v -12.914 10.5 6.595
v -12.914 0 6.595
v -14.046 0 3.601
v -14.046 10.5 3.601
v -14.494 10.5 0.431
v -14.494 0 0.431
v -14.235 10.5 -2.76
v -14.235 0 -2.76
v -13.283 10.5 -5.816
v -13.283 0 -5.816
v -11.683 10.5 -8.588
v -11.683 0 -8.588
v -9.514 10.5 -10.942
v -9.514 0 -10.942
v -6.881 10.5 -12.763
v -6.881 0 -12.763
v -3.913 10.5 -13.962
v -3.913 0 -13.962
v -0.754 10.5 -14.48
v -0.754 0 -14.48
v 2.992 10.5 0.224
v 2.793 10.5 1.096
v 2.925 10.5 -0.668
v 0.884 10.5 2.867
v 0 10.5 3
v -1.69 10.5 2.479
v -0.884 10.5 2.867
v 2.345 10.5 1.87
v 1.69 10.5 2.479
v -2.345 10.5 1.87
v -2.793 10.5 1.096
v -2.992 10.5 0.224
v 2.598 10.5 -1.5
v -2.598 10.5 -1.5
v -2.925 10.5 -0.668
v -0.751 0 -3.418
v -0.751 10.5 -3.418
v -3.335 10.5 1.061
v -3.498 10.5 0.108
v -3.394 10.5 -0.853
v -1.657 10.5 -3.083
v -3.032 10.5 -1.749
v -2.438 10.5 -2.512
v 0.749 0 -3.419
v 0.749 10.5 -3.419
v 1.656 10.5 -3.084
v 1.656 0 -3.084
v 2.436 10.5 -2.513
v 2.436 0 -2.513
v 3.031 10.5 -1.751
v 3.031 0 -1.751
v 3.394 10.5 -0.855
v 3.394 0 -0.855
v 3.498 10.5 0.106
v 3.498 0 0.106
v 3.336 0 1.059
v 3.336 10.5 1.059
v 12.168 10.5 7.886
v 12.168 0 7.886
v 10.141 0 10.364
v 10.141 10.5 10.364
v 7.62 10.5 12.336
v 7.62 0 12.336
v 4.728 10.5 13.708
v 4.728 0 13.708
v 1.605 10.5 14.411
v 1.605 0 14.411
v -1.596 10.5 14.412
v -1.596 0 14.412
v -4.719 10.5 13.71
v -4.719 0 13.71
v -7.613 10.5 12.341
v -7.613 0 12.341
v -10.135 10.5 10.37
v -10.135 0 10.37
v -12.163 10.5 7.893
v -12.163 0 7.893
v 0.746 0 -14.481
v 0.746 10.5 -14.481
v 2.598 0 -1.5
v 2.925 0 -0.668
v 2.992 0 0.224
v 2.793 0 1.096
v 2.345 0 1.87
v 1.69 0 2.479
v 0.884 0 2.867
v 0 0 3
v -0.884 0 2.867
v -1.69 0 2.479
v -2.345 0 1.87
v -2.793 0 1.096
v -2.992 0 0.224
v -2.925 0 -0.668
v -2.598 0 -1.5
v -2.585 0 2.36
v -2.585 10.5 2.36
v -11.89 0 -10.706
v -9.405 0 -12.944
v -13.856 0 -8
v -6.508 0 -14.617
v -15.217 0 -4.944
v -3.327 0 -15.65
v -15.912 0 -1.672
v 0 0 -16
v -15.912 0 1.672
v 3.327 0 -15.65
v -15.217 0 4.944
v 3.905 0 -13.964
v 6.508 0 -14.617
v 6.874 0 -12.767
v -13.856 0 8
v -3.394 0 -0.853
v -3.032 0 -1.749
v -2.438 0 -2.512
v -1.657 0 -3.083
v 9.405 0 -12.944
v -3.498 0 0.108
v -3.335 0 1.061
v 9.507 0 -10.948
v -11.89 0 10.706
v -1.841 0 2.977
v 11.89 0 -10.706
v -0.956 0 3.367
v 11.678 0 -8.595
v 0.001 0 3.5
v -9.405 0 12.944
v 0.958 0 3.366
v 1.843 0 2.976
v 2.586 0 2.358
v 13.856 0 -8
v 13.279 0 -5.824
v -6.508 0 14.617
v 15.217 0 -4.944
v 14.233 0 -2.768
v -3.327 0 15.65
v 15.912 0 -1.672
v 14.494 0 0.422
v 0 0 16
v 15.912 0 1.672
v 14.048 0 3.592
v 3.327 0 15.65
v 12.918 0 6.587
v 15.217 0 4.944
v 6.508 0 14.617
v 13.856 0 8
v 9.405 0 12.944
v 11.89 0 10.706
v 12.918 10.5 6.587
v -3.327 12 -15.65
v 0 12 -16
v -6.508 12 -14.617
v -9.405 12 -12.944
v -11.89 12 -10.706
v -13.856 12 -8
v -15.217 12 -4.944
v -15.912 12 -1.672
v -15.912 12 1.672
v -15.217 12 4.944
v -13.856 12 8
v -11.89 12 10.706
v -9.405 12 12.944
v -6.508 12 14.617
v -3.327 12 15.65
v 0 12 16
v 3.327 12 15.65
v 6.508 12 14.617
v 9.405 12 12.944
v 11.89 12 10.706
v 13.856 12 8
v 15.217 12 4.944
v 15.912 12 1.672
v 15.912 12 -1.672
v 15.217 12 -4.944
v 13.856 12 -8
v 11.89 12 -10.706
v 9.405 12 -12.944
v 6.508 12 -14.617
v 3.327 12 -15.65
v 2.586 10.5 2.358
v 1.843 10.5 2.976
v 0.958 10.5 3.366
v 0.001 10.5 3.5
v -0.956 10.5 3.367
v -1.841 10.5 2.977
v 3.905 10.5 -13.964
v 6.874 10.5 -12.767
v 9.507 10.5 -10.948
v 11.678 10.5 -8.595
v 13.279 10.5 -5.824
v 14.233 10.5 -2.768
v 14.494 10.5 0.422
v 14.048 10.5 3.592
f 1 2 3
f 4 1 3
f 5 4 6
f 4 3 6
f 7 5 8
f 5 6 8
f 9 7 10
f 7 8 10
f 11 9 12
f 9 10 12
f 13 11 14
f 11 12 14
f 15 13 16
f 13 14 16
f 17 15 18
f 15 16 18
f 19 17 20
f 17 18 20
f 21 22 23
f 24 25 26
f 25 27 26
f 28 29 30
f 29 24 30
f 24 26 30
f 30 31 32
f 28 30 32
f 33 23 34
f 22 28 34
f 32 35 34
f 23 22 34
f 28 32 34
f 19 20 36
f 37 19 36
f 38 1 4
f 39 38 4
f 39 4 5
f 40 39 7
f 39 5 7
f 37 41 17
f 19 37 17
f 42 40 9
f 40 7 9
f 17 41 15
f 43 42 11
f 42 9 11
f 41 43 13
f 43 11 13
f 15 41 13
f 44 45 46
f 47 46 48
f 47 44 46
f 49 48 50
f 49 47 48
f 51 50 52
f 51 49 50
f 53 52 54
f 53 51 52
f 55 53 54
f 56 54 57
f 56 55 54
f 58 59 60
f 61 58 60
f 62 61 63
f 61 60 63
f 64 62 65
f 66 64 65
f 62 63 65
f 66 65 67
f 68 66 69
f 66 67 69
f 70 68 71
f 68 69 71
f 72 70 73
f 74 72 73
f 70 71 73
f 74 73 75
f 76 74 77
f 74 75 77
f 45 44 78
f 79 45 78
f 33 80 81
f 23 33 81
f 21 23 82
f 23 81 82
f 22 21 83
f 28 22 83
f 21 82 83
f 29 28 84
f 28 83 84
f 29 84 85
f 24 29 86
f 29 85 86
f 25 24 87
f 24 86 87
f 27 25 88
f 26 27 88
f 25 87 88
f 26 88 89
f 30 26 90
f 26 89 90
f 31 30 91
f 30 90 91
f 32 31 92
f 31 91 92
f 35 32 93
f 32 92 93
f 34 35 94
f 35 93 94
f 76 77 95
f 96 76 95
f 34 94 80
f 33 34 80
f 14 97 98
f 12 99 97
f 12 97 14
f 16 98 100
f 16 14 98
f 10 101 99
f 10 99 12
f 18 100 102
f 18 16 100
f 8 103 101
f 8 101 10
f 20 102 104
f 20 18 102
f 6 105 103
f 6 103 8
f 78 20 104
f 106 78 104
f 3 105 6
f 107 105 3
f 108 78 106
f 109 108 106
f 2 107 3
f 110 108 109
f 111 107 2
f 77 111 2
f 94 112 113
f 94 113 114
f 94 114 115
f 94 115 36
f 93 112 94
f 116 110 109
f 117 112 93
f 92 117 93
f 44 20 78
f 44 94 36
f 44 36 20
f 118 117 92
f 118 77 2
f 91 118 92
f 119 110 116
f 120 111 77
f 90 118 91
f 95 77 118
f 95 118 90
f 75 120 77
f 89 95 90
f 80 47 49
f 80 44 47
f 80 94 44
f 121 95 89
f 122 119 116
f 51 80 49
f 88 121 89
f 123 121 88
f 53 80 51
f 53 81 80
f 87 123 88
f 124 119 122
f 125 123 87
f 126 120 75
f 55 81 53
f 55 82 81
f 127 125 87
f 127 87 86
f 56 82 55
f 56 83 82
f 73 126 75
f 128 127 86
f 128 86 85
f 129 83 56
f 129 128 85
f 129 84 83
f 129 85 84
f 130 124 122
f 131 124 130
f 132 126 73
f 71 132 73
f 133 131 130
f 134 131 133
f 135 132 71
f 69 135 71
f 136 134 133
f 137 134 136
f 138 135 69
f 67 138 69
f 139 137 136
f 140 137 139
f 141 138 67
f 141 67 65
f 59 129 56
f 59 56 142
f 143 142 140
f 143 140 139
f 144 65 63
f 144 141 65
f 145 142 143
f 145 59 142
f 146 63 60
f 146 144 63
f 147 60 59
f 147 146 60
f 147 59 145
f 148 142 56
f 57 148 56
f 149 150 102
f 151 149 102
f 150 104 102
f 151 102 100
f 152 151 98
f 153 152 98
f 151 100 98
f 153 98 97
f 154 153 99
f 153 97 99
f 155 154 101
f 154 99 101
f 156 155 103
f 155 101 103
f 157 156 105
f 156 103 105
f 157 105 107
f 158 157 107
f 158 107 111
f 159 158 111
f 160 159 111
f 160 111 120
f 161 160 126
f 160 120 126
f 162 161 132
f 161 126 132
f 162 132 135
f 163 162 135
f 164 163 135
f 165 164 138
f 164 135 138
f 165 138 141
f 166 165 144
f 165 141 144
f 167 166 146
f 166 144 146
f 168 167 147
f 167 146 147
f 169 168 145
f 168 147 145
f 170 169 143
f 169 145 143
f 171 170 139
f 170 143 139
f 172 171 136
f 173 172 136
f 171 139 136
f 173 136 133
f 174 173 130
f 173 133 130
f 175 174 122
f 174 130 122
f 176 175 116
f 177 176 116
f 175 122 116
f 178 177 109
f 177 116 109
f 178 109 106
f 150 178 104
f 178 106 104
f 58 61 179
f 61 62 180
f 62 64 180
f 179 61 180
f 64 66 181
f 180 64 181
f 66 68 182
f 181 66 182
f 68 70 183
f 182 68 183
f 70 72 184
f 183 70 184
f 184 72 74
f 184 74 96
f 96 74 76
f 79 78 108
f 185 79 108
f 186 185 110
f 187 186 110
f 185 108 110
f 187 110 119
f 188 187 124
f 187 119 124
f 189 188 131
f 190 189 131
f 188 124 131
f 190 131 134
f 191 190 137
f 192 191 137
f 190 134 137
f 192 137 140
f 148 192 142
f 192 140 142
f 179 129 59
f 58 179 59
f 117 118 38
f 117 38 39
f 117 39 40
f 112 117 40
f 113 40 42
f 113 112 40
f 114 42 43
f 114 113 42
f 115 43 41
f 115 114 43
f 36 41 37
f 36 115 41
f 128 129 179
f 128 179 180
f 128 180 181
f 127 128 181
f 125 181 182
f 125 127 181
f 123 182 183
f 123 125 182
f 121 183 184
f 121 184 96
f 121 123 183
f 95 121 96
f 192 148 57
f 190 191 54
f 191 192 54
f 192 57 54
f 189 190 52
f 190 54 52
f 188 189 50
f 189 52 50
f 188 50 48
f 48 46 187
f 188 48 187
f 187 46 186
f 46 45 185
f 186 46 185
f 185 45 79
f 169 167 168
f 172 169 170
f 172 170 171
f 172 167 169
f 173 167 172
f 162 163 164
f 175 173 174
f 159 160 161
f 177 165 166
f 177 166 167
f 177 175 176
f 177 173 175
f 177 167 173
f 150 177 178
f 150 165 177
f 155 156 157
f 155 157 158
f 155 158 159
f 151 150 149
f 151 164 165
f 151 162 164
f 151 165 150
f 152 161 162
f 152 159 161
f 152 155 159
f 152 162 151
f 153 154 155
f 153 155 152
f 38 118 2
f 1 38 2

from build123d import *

# Parameters (mm, degrees)
SKETCH1_R           = 16
BOSS_EXTRUDE1_DEPTH = 10.5
SKETCH2_R           = 16
BOSS_EXTRUDE2_DEPTH = 1.5
BOSS_EXTRUDE3_START = 10.5
SKETCH3_R           = 3.5
BOSS_EXTRUDE3_DEPTH = 10.5


with BuildPart() as part:
    # Sketch1 → Boss-Extrude1 (new body)
    with BuildSketch(Plane(origin=(0, 0, 0), x_dir=(1, 0, 0), z_dir=(0, 1, 0))):
        with Locations(Location((0, 0, 0), (0, 0, 90))):
            Circle(SKETCH1_R)
        with BuildLine():
            Line((-0.754325558, 14.480365774), (-0.751021188, 3.418474393))
            ThreePointArc((-0.751021188, 3.418474393), (-0.001045508, 3.499999844), (0.748978745, 3.418922468))
            Line((0.748978745, 3.418922468), (0.745674375, 14.480813849))
            ThreePointArc((0.745674375, 14.480813849), (12.5552021, 7.25375077), (12.917527395, -6.586917791))
            Line((12.917527395, -6.586917791), (3.335996261, -1.058833769))
            ThreePointArc((3.335996261, -1.058833769), (3.031611532, -1.749094486), (2.586384338, -2.358095854))
            Line((2.586384338, -2.358095854), (12.167915473, -7.886179876))
            ThreePointArc((12.167915473, -7.886179876), (0.004331389, -14.499999353), (-12.163201838, -7.893447983))
            Line((-12.163201838, -7.893447983), (-2.584975072, -2.359640624))
            ThreePointArc((-2.584975072, -2.359640624), (-3.030566024, -1.750905358), (-3.335363083, -1.060826614))
            Line((-3.335363083, -1.060826614), (-12.913589848, -6.594633973))
            ThreePointArc((-12.913589848, -6.594633973), (-12.559533489, 7.246248583), (-0.754325558, 14.480365774))
        make_face(mode=Mode.SUBTRACT)
    extrude(amount=BOSS_EXTRUDE1_DEPTH)

    # Sketch2 → Boss-Extrude2 (add)
    with BuildSketch(Plane(origin=(0, 10.5, 0), x_dir=(1, 0, 0), z_dir=(0, 1, 0))):
        with Locations(Location((0, 0, 0), (0, 0, 90))):
            Circle(SKETCH2_R)
    extrude(amount=BOSS_EXTRUDE2_DEPTH)

    # Sketch3 → Boss-Extrude3 (add)
    with BuildSketch(Plane.XZ.offset(-10.5).offset(BOSS_EXTRUDE3_START)):
        Circle(SKETCH3_R)
        with BuildLine():
            Line((-2.598076211, -1.5), (2.598076211, -1.5))
            ThreePointArc((2.598076211, -1.5), (0, 3), (-2.598076211, -1.5))
        make_face(mode=Mode.SUBTRACT)
    extrude(amount=-BOSS_EXTRUDE3_DEPTH)


solid = part.part
